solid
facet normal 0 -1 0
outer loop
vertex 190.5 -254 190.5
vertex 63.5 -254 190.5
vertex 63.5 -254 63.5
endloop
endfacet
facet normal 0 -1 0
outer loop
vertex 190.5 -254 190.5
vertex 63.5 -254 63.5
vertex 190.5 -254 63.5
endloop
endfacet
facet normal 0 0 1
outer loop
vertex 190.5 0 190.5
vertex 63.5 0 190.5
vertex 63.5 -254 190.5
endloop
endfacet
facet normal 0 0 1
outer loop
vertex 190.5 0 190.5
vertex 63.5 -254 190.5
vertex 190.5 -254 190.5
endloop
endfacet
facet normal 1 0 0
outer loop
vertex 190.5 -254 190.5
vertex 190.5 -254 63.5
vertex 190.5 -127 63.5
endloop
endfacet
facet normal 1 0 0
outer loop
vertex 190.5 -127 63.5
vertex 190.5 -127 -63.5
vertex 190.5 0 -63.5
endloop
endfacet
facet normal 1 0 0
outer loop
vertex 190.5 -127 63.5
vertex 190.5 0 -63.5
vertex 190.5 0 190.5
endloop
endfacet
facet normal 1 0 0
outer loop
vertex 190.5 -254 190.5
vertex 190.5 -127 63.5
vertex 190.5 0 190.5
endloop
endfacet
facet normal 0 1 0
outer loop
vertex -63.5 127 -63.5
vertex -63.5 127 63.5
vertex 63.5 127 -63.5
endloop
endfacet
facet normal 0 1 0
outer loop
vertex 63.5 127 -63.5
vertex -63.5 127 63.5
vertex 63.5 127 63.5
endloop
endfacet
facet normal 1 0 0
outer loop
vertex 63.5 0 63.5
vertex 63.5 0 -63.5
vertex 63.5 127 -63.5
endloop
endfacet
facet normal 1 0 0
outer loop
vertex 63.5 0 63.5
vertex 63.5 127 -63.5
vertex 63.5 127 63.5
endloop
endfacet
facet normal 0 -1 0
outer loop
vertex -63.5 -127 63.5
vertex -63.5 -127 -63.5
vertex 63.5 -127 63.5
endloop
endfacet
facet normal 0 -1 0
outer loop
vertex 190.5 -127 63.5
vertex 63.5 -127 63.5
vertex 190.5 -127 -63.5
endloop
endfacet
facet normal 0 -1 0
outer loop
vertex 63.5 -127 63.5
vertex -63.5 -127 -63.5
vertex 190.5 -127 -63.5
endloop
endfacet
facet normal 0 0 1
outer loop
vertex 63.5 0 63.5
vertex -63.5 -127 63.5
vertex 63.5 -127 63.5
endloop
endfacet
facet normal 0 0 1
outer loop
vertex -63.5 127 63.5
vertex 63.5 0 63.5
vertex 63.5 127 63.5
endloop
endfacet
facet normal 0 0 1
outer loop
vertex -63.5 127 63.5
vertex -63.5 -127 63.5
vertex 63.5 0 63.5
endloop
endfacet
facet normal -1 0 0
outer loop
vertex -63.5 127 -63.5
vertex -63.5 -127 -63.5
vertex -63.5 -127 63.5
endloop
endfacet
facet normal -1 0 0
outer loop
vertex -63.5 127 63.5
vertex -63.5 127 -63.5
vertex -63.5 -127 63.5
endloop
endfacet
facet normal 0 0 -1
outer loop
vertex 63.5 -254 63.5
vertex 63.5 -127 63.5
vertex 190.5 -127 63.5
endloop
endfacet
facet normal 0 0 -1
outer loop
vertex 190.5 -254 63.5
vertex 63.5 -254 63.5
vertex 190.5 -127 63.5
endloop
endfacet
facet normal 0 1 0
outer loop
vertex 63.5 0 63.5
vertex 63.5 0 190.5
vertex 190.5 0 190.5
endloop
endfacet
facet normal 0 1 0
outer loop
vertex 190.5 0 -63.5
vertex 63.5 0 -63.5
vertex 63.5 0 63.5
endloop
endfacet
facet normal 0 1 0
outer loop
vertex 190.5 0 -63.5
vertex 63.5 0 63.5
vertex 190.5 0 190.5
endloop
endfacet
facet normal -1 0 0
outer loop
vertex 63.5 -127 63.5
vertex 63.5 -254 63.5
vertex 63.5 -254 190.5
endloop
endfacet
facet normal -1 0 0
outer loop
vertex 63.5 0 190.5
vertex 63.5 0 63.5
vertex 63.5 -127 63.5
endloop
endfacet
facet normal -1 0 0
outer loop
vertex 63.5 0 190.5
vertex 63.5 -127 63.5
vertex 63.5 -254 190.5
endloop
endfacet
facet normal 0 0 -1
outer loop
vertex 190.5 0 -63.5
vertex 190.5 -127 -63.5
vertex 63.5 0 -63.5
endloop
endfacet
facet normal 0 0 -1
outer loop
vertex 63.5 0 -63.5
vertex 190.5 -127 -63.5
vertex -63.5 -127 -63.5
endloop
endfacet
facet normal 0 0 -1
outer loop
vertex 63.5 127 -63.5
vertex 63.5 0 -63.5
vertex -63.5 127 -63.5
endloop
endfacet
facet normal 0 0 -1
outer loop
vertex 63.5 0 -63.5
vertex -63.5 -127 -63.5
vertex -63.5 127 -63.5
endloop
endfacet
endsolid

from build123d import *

# Parameters (mm, degrees)
F0_W     = 127
F0_H     = 127
F1_DEPTH = 127
F2_W     = 127
F2_H     = 127
F3_DEPTH = 127
F4_W     = 127
F4_H     = 127
F5_DEPTH = 127
F6_W     = 127
F6_H     = 127
F7_DEPTH = 127


with BuildPart() as f1:
    # F0 (on Front) → F1 (new body, symmetric)
    with BuildSketch(Plane.XZ):
        Rectangle(F0_W, F0_H)
    extrude(amount=F1_DEPTH, both=True)

    # F2 (on face) → F3 (join)
    with BuildSketch(Plane.YZ.offset(63.5)):
        with Locations((-63.5, 0)):
            Rectangle(F2_W, F2_H)
    extrude(amount=F3_DEPTH)

    # F4 (on face) → F5 (join)
    with BuildSketch(Plane.XY.offset(63.5)):
        with Locations((127, -63.5)):
            Rectangle(F4_W, F4_H)
    extrude(amount=F5_DEPTH)

    # F6 (on face) → F7 (join)
    with BuildSketch(Plane.XZ.offset(127)):
        with Locations((127, 127)):
            Rectangle(F6_W, F6_H)
    extrude(amount=F7_DEPTH)


solid = f1.part
